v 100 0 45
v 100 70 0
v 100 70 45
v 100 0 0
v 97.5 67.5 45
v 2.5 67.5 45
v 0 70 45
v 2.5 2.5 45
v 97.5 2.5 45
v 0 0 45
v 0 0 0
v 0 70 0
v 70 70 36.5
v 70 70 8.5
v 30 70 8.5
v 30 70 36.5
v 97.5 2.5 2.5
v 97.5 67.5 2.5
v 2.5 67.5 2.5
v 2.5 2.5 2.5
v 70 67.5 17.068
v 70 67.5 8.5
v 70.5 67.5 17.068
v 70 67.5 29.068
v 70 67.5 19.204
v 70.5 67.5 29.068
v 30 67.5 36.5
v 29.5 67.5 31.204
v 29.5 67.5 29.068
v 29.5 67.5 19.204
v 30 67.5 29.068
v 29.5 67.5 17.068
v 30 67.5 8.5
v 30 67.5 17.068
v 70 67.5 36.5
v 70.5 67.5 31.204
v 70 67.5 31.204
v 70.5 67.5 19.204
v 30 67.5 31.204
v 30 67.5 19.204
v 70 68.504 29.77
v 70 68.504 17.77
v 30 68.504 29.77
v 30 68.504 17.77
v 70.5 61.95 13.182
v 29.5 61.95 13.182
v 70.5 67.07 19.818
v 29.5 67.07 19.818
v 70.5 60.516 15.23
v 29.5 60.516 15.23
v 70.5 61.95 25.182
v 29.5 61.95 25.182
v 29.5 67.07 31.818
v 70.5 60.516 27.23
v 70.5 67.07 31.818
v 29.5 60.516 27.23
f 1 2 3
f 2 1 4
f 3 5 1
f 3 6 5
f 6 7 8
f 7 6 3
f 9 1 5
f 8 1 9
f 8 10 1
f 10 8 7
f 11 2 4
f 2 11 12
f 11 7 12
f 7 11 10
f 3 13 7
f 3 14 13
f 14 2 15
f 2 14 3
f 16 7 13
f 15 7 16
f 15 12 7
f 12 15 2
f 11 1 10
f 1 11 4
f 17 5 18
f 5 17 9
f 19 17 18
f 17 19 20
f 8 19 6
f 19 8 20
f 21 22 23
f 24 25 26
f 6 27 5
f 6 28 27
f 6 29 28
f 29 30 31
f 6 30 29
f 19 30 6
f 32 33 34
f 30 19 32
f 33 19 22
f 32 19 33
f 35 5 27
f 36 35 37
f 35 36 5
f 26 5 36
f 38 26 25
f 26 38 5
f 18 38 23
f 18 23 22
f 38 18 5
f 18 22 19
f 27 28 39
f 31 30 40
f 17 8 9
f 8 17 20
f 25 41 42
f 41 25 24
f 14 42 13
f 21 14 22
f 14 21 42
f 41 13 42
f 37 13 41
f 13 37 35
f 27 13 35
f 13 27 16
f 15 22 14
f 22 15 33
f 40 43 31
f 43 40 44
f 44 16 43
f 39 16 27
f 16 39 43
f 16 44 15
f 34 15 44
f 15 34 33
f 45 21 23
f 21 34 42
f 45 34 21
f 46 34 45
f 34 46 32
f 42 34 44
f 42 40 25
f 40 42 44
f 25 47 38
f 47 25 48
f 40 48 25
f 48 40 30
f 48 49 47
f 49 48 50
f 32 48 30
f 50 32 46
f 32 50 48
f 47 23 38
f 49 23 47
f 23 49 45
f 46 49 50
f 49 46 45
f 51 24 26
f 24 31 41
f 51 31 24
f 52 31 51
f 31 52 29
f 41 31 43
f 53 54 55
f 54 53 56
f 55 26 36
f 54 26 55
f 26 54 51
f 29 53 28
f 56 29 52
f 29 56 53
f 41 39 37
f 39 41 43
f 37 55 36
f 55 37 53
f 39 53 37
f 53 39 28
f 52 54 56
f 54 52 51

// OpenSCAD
$fn = 32;

// ----------------------------------------------------------------------
// Vent box: louvers enclosure
// ----------------------------------------------------------------------

// --- parameters (mm) ---
box_l = 100;              // box length, X
box_w = 70;               // box width, Y
box_h = 45;               // box height, Z
wall_t = 2.5;             // shell wall thickness
win_l = 40;               // vent window width, X
win_h = 28;               // vent window height, Z
slat_t = 2.5;             // louver slat thickness
slat_d = 8;               // louver slat depth
slat_a = 35;              // louver slat angle, degrees
slat_pitch = 12;          // louver pitch
slat_yc = 64.51;          // slat centreline Y

win_z0 = (box_h - win_h) / 2;  // window lower edge Z
n_slats = 2;  // louver count
slat_z0 = win_z0 + (win_h - (n_slats - 1) * slat_pitch) / 2;

difference() {
  union() {
    difference() {
      cube([box_l, box_w, box_h]);
  translate([wall_t, wall_t, wall_t])
    cube([box_l - 2 * wall_t, box_w - 2 * wall_t, box_h]);
  translate([(box_l - win_l) / 2, box_w - wall_t - 1, win_z0])
    cube([win_l, wall_t + 2, win_h]);
    }
    for (i = [0 : n_slats - 1])
      translate([box_l / 2, slat_yc, slat_z0 + i * slat_pitch])
        rotate([slat_a, 0, 0])
          cube([win_l + 1, slat_d, slat_t], center = true);
  }
}
